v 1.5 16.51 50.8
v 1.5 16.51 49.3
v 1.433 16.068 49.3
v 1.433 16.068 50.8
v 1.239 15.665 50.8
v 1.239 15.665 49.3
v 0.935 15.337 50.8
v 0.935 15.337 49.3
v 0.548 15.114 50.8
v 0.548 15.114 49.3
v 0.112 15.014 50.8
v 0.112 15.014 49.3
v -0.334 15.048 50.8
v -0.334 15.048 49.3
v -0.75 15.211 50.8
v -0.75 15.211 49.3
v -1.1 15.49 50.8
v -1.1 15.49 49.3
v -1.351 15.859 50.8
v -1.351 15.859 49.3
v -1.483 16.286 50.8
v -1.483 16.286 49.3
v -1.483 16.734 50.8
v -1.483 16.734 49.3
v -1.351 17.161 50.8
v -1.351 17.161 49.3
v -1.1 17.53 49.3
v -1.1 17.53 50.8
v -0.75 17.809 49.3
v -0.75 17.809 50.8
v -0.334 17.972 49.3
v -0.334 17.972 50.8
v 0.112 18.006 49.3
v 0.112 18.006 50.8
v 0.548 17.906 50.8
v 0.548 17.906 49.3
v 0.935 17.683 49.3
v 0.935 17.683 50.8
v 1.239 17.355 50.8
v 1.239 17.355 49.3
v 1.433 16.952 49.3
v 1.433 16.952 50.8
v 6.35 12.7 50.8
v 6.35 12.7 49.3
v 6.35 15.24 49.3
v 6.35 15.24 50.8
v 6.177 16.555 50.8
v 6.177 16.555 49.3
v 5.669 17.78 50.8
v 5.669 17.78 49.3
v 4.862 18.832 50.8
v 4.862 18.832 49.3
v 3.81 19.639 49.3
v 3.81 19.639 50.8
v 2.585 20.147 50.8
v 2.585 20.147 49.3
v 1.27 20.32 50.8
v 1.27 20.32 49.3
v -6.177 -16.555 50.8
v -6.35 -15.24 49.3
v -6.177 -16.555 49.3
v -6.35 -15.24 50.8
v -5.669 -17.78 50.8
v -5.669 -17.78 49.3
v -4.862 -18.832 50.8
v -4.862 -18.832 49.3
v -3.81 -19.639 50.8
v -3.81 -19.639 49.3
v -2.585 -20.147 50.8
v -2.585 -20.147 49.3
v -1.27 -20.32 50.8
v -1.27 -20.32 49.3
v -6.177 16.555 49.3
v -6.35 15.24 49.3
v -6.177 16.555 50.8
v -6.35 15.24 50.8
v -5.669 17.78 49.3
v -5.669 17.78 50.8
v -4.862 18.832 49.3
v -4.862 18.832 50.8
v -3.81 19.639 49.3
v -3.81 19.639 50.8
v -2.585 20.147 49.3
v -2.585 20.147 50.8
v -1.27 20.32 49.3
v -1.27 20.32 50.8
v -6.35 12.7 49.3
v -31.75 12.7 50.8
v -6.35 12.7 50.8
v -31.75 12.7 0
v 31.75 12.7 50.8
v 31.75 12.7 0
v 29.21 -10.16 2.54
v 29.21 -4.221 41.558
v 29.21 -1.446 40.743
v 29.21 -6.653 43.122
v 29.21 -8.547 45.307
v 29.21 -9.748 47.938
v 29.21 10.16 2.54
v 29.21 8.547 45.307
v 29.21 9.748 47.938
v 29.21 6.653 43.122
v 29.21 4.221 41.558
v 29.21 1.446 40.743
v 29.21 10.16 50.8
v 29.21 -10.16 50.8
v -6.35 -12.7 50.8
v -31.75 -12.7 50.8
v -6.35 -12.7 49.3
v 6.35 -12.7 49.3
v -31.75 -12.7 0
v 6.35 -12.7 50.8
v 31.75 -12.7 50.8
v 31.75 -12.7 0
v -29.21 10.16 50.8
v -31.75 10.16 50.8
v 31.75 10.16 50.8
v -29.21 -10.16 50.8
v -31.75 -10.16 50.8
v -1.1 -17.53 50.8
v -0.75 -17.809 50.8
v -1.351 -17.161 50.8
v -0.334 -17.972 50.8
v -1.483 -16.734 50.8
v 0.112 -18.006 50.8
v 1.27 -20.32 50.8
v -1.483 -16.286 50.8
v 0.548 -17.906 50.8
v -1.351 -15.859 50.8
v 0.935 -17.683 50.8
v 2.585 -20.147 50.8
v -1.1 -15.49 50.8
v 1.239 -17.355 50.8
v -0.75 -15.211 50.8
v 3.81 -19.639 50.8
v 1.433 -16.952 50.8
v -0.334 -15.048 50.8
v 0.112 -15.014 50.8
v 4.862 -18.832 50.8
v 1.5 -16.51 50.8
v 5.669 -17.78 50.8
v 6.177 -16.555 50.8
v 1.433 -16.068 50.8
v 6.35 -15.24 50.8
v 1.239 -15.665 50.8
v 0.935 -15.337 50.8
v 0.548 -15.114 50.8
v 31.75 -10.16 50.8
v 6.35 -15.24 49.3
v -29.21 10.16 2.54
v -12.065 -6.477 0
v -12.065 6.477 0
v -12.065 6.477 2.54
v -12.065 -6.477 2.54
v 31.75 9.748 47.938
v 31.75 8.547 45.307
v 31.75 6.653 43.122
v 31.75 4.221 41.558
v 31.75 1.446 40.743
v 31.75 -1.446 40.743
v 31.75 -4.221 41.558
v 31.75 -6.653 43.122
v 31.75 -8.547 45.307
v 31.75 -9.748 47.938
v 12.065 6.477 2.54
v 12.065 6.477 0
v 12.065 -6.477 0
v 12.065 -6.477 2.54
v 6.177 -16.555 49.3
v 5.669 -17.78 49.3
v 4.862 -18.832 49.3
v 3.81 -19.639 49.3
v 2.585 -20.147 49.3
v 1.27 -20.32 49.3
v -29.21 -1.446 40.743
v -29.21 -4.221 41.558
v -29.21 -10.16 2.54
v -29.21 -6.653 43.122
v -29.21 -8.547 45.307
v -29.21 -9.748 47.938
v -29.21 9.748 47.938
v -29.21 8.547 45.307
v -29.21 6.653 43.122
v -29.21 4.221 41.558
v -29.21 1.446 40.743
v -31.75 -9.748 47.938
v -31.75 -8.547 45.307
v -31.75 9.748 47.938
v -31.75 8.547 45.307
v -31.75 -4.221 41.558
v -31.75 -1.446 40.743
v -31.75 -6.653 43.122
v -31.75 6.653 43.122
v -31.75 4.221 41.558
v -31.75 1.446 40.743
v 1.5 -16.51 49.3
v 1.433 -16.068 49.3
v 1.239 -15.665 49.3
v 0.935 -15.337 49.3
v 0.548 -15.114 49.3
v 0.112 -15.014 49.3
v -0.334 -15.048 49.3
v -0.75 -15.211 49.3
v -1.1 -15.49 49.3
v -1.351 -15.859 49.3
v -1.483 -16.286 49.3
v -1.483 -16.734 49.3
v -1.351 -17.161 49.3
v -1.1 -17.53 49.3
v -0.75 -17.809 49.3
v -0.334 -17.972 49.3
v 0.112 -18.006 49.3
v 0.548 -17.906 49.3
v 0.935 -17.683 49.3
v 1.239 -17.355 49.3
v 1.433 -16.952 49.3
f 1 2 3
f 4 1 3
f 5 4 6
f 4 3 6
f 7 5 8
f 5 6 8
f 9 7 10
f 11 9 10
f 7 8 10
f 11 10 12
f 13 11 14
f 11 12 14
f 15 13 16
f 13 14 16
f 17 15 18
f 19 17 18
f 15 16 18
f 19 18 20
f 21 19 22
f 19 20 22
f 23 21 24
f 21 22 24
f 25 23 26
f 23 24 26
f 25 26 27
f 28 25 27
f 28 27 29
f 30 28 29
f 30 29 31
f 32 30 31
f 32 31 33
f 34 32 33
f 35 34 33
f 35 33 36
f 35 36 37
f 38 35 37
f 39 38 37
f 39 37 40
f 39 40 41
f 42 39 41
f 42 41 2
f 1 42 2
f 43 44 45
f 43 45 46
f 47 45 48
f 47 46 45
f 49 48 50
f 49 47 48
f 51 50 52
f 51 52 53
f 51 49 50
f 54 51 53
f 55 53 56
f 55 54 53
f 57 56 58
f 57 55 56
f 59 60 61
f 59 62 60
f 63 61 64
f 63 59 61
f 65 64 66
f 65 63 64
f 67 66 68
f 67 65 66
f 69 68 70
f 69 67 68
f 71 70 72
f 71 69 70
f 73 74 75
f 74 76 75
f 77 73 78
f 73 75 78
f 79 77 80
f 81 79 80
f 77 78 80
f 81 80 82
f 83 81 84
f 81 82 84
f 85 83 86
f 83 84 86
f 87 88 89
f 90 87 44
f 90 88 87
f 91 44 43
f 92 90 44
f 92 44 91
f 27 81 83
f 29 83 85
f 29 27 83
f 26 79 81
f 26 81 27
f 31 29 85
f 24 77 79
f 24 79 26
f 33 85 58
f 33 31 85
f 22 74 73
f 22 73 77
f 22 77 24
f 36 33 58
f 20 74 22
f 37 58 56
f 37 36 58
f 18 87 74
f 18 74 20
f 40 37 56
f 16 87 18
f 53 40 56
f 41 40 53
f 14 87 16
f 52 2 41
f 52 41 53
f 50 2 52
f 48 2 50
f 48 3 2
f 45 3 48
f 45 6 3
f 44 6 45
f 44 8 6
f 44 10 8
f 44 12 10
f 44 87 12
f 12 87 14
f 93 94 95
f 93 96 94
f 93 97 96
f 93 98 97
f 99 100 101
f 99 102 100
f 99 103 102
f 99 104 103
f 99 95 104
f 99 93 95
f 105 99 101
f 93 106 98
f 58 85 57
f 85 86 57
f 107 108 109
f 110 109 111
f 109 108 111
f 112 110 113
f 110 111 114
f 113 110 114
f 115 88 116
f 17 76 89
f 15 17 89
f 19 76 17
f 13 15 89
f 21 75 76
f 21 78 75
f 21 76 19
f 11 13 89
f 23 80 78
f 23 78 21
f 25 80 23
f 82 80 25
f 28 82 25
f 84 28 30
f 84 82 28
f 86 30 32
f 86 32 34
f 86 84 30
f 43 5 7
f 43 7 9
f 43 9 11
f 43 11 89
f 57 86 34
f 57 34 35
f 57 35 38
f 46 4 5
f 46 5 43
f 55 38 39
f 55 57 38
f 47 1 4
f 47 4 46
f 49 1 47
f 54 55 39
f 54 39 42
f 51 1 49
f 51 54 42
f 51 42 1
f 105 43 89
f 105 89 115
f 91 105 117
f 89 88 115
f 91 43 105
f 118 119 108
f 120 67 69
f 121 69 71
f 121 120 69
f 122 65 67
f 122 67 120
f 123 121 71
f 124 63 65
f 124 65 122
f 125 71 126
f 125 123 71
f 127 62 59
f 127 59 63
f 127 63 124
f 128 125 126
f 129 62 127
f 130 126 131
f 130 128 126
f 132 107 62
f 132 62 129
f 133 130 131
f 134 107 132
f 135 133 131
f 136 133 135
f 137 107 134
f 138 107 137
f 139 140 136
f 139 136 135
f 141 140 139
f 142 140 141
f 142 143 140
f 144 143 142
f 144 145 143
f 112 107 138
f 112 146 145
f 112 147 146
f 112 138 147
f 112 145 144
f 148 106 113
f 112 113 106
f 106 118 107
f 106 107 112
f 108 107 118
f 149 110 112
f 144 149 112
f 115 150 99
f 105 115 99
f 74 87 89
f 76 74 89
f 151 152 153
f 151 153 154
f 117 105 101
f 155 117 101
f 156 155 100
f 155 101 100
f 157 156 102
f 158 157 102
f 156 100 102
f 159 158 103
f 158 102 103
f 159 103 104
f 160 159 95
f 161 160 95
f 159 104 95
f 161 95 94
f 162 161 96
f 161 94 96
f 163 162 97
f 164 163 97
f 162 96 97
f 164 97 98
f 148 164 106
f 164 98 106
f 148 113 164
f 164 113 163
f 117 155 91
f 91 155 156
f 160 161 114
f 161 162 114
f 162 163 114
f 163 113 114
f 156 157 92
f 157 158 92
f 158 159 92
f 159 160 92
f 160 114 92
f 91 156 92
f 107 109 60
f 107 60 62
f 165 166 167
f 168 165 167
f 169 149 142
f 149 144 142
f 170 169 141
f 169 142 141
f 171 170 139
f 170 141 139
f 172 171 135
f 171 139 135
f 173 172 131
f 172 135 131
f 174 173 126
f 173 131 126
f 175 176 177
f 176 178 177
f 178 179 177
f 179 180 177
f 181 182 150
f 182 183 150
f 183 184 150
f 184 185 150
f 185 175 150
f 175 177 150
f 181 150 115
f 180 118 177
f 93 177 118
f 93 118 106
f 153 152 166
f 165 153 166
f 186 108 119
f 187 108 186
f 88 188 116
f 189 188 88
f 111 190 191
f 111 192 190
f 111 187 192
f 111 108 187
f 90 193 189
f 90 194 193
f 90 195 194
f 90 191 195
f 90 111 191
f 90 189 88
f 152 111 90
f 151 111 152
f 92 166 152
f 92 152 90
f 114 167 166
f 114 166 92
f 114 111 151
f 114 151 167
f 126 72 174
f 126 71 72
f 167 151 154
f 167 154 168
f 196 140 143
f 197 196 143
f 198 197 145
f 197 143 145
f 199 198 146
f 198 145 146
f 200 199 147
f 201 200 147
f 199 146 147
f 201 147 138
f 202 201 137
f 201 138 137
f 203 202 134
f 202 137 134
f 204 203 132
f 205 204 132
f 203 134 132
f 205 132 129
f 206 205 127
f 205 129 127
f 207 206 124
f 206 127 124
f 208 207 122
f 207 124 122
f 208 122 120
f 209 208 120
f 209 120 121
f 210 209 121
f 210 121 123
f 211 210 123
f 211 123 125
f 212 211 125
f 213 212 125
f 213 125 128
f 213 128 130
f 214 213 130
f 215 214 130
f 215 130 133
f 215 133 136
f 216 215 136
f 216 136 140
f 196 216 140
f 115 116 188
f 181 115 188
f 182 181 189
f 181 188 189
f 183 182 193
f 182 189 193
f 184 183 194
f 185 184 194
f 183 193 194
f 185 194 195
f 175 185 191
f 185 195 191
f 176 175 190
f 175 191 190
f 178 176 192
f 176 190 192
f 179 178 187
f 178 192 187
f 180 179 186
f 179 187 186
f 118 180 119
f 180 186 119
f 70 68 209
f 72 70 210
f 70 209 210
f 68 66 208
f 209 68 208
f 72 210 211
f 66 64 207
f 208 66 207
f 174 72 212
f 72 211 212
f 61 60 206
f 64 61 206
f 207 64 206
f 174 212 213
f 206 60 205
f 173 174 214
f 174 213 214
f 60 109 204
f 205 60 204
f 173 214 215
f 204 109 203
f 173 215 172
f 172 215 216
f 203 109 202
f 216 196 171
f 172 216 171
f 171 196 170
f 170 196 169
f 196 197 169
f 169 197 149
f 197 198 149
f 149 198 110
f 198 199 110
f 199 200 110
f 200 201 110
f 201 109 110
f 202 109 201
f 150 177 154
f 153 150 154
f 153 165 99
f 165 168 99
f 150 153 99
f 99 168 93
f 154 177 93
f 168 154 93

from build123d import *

# Parameters (mm, degrees)
F0_W      = 63.5
F0_H      = 25.4
F0_W_2    = 58.42
F0_H_2    = 20.32
F1_DEPTH  = 50.8
F2_W      = 58.42
F2_H      = 20.32
F3_DEPTH  = 2.54
F4_R      = 10.16
F5_DEPTH  = 63.501
F7_W      = 12.7
F7_H      = 1.5
F8_DEPTH  = 7.62
F10_R     = 1.5
F11_DEPTH = 25.4
F12_R     = 1.5
F13_DEPTH = 25.4
F14_R     = 5.08
F6_W      = 24.13
F6_H      = 12.954
F15_DEPTH = 25.4


with BuildPart() as f1:
    # F0 (on Top) → F1 (new body)
    with BuildSketch(Plane.XY):
        Rectangle(F0_W, F0_H)
        Rectangle(F0_W_2, F0_H_2, mode=Mode.SUBTRACT)
    extrude(amount=F1_DEPTH)

    # F2 (on face) → F3 (join)
    with BuildSketch(Plane(origin=(0, 0, 0), x_dir=(1, 0, 0), z_dir=(0, 0, -1))):
        Rectangle(F2_W, F2_H)
    extrude(amount=-F3_DEPTH)

    # F4 (on face) → F5 (cut, through all)
    with BuildSketch(Plane(origin=(-31.75, 0, 0), x_dir=(0, -1, 0), z_dir=(-1, 0, 0))):
        with Locations((0, 50.8)):
            Circle(F4_R)
    extrude(amount=-F5_DEPTH, mode=Mode.SUBTRACT)

    # F7 (on face) → F8 (join)
    with BuildSketch(Plane.XZ.offset(12.7)):
        with Locations((0, 50.05)):
            Rectangle(F7_W, F7_H)
    extrude(amount=F8_DEPTH)

    # F9: F1 across plane


with BuildPart() as f1_1:
    add(f1.part)
    add(f1.part.mirror(Plane.XZ))

    # F10 (on face) → F11 (cut)
    with BuildSketch(Plane.XY.offset(50.8)):
        with Locations((0, -16.51)):
            Circle(F10_R)
    extrude(amount=-F11_DEPTH, mode=Mode.SUBTRACT)

    # F12 (on face) → F13 (cut)
    with BuildSketch(Plane(origin=(0, 0, 49.3), x_dir=(1, 0, 0), z_dir=(0, 0, -1))):
        with Locations((0, -16.51)):
            Circle(F12_R)
    extrude(amount=-F13_DEPTH, mode=Mode.SUBTRACT)

    # F14
    f14_edges = [f1_1.edges().sort_by_distance(p)[0] for p in [
        (6.35, 20.32, 50.05),
        (-6.35, 20.32, 50.05),
        (6.35, -20.32, 50.05),
        (-6.35, -20.32, 50.05),
    ]]
    fillet(f14_edges, radius=F14_R)

    # F6 (on face) → F15 (cut)
    with BuildSketch(Plane(origin=(0, 0, 0), x_dir=(1, 0, 0), z_dir=(0, 0, -1))):
        Rectangle(F6_W, F6_H)
    extrude(amount=-F15_DEPTH, mode=Mode.SUBTRACT)


solid = f1_1.part
